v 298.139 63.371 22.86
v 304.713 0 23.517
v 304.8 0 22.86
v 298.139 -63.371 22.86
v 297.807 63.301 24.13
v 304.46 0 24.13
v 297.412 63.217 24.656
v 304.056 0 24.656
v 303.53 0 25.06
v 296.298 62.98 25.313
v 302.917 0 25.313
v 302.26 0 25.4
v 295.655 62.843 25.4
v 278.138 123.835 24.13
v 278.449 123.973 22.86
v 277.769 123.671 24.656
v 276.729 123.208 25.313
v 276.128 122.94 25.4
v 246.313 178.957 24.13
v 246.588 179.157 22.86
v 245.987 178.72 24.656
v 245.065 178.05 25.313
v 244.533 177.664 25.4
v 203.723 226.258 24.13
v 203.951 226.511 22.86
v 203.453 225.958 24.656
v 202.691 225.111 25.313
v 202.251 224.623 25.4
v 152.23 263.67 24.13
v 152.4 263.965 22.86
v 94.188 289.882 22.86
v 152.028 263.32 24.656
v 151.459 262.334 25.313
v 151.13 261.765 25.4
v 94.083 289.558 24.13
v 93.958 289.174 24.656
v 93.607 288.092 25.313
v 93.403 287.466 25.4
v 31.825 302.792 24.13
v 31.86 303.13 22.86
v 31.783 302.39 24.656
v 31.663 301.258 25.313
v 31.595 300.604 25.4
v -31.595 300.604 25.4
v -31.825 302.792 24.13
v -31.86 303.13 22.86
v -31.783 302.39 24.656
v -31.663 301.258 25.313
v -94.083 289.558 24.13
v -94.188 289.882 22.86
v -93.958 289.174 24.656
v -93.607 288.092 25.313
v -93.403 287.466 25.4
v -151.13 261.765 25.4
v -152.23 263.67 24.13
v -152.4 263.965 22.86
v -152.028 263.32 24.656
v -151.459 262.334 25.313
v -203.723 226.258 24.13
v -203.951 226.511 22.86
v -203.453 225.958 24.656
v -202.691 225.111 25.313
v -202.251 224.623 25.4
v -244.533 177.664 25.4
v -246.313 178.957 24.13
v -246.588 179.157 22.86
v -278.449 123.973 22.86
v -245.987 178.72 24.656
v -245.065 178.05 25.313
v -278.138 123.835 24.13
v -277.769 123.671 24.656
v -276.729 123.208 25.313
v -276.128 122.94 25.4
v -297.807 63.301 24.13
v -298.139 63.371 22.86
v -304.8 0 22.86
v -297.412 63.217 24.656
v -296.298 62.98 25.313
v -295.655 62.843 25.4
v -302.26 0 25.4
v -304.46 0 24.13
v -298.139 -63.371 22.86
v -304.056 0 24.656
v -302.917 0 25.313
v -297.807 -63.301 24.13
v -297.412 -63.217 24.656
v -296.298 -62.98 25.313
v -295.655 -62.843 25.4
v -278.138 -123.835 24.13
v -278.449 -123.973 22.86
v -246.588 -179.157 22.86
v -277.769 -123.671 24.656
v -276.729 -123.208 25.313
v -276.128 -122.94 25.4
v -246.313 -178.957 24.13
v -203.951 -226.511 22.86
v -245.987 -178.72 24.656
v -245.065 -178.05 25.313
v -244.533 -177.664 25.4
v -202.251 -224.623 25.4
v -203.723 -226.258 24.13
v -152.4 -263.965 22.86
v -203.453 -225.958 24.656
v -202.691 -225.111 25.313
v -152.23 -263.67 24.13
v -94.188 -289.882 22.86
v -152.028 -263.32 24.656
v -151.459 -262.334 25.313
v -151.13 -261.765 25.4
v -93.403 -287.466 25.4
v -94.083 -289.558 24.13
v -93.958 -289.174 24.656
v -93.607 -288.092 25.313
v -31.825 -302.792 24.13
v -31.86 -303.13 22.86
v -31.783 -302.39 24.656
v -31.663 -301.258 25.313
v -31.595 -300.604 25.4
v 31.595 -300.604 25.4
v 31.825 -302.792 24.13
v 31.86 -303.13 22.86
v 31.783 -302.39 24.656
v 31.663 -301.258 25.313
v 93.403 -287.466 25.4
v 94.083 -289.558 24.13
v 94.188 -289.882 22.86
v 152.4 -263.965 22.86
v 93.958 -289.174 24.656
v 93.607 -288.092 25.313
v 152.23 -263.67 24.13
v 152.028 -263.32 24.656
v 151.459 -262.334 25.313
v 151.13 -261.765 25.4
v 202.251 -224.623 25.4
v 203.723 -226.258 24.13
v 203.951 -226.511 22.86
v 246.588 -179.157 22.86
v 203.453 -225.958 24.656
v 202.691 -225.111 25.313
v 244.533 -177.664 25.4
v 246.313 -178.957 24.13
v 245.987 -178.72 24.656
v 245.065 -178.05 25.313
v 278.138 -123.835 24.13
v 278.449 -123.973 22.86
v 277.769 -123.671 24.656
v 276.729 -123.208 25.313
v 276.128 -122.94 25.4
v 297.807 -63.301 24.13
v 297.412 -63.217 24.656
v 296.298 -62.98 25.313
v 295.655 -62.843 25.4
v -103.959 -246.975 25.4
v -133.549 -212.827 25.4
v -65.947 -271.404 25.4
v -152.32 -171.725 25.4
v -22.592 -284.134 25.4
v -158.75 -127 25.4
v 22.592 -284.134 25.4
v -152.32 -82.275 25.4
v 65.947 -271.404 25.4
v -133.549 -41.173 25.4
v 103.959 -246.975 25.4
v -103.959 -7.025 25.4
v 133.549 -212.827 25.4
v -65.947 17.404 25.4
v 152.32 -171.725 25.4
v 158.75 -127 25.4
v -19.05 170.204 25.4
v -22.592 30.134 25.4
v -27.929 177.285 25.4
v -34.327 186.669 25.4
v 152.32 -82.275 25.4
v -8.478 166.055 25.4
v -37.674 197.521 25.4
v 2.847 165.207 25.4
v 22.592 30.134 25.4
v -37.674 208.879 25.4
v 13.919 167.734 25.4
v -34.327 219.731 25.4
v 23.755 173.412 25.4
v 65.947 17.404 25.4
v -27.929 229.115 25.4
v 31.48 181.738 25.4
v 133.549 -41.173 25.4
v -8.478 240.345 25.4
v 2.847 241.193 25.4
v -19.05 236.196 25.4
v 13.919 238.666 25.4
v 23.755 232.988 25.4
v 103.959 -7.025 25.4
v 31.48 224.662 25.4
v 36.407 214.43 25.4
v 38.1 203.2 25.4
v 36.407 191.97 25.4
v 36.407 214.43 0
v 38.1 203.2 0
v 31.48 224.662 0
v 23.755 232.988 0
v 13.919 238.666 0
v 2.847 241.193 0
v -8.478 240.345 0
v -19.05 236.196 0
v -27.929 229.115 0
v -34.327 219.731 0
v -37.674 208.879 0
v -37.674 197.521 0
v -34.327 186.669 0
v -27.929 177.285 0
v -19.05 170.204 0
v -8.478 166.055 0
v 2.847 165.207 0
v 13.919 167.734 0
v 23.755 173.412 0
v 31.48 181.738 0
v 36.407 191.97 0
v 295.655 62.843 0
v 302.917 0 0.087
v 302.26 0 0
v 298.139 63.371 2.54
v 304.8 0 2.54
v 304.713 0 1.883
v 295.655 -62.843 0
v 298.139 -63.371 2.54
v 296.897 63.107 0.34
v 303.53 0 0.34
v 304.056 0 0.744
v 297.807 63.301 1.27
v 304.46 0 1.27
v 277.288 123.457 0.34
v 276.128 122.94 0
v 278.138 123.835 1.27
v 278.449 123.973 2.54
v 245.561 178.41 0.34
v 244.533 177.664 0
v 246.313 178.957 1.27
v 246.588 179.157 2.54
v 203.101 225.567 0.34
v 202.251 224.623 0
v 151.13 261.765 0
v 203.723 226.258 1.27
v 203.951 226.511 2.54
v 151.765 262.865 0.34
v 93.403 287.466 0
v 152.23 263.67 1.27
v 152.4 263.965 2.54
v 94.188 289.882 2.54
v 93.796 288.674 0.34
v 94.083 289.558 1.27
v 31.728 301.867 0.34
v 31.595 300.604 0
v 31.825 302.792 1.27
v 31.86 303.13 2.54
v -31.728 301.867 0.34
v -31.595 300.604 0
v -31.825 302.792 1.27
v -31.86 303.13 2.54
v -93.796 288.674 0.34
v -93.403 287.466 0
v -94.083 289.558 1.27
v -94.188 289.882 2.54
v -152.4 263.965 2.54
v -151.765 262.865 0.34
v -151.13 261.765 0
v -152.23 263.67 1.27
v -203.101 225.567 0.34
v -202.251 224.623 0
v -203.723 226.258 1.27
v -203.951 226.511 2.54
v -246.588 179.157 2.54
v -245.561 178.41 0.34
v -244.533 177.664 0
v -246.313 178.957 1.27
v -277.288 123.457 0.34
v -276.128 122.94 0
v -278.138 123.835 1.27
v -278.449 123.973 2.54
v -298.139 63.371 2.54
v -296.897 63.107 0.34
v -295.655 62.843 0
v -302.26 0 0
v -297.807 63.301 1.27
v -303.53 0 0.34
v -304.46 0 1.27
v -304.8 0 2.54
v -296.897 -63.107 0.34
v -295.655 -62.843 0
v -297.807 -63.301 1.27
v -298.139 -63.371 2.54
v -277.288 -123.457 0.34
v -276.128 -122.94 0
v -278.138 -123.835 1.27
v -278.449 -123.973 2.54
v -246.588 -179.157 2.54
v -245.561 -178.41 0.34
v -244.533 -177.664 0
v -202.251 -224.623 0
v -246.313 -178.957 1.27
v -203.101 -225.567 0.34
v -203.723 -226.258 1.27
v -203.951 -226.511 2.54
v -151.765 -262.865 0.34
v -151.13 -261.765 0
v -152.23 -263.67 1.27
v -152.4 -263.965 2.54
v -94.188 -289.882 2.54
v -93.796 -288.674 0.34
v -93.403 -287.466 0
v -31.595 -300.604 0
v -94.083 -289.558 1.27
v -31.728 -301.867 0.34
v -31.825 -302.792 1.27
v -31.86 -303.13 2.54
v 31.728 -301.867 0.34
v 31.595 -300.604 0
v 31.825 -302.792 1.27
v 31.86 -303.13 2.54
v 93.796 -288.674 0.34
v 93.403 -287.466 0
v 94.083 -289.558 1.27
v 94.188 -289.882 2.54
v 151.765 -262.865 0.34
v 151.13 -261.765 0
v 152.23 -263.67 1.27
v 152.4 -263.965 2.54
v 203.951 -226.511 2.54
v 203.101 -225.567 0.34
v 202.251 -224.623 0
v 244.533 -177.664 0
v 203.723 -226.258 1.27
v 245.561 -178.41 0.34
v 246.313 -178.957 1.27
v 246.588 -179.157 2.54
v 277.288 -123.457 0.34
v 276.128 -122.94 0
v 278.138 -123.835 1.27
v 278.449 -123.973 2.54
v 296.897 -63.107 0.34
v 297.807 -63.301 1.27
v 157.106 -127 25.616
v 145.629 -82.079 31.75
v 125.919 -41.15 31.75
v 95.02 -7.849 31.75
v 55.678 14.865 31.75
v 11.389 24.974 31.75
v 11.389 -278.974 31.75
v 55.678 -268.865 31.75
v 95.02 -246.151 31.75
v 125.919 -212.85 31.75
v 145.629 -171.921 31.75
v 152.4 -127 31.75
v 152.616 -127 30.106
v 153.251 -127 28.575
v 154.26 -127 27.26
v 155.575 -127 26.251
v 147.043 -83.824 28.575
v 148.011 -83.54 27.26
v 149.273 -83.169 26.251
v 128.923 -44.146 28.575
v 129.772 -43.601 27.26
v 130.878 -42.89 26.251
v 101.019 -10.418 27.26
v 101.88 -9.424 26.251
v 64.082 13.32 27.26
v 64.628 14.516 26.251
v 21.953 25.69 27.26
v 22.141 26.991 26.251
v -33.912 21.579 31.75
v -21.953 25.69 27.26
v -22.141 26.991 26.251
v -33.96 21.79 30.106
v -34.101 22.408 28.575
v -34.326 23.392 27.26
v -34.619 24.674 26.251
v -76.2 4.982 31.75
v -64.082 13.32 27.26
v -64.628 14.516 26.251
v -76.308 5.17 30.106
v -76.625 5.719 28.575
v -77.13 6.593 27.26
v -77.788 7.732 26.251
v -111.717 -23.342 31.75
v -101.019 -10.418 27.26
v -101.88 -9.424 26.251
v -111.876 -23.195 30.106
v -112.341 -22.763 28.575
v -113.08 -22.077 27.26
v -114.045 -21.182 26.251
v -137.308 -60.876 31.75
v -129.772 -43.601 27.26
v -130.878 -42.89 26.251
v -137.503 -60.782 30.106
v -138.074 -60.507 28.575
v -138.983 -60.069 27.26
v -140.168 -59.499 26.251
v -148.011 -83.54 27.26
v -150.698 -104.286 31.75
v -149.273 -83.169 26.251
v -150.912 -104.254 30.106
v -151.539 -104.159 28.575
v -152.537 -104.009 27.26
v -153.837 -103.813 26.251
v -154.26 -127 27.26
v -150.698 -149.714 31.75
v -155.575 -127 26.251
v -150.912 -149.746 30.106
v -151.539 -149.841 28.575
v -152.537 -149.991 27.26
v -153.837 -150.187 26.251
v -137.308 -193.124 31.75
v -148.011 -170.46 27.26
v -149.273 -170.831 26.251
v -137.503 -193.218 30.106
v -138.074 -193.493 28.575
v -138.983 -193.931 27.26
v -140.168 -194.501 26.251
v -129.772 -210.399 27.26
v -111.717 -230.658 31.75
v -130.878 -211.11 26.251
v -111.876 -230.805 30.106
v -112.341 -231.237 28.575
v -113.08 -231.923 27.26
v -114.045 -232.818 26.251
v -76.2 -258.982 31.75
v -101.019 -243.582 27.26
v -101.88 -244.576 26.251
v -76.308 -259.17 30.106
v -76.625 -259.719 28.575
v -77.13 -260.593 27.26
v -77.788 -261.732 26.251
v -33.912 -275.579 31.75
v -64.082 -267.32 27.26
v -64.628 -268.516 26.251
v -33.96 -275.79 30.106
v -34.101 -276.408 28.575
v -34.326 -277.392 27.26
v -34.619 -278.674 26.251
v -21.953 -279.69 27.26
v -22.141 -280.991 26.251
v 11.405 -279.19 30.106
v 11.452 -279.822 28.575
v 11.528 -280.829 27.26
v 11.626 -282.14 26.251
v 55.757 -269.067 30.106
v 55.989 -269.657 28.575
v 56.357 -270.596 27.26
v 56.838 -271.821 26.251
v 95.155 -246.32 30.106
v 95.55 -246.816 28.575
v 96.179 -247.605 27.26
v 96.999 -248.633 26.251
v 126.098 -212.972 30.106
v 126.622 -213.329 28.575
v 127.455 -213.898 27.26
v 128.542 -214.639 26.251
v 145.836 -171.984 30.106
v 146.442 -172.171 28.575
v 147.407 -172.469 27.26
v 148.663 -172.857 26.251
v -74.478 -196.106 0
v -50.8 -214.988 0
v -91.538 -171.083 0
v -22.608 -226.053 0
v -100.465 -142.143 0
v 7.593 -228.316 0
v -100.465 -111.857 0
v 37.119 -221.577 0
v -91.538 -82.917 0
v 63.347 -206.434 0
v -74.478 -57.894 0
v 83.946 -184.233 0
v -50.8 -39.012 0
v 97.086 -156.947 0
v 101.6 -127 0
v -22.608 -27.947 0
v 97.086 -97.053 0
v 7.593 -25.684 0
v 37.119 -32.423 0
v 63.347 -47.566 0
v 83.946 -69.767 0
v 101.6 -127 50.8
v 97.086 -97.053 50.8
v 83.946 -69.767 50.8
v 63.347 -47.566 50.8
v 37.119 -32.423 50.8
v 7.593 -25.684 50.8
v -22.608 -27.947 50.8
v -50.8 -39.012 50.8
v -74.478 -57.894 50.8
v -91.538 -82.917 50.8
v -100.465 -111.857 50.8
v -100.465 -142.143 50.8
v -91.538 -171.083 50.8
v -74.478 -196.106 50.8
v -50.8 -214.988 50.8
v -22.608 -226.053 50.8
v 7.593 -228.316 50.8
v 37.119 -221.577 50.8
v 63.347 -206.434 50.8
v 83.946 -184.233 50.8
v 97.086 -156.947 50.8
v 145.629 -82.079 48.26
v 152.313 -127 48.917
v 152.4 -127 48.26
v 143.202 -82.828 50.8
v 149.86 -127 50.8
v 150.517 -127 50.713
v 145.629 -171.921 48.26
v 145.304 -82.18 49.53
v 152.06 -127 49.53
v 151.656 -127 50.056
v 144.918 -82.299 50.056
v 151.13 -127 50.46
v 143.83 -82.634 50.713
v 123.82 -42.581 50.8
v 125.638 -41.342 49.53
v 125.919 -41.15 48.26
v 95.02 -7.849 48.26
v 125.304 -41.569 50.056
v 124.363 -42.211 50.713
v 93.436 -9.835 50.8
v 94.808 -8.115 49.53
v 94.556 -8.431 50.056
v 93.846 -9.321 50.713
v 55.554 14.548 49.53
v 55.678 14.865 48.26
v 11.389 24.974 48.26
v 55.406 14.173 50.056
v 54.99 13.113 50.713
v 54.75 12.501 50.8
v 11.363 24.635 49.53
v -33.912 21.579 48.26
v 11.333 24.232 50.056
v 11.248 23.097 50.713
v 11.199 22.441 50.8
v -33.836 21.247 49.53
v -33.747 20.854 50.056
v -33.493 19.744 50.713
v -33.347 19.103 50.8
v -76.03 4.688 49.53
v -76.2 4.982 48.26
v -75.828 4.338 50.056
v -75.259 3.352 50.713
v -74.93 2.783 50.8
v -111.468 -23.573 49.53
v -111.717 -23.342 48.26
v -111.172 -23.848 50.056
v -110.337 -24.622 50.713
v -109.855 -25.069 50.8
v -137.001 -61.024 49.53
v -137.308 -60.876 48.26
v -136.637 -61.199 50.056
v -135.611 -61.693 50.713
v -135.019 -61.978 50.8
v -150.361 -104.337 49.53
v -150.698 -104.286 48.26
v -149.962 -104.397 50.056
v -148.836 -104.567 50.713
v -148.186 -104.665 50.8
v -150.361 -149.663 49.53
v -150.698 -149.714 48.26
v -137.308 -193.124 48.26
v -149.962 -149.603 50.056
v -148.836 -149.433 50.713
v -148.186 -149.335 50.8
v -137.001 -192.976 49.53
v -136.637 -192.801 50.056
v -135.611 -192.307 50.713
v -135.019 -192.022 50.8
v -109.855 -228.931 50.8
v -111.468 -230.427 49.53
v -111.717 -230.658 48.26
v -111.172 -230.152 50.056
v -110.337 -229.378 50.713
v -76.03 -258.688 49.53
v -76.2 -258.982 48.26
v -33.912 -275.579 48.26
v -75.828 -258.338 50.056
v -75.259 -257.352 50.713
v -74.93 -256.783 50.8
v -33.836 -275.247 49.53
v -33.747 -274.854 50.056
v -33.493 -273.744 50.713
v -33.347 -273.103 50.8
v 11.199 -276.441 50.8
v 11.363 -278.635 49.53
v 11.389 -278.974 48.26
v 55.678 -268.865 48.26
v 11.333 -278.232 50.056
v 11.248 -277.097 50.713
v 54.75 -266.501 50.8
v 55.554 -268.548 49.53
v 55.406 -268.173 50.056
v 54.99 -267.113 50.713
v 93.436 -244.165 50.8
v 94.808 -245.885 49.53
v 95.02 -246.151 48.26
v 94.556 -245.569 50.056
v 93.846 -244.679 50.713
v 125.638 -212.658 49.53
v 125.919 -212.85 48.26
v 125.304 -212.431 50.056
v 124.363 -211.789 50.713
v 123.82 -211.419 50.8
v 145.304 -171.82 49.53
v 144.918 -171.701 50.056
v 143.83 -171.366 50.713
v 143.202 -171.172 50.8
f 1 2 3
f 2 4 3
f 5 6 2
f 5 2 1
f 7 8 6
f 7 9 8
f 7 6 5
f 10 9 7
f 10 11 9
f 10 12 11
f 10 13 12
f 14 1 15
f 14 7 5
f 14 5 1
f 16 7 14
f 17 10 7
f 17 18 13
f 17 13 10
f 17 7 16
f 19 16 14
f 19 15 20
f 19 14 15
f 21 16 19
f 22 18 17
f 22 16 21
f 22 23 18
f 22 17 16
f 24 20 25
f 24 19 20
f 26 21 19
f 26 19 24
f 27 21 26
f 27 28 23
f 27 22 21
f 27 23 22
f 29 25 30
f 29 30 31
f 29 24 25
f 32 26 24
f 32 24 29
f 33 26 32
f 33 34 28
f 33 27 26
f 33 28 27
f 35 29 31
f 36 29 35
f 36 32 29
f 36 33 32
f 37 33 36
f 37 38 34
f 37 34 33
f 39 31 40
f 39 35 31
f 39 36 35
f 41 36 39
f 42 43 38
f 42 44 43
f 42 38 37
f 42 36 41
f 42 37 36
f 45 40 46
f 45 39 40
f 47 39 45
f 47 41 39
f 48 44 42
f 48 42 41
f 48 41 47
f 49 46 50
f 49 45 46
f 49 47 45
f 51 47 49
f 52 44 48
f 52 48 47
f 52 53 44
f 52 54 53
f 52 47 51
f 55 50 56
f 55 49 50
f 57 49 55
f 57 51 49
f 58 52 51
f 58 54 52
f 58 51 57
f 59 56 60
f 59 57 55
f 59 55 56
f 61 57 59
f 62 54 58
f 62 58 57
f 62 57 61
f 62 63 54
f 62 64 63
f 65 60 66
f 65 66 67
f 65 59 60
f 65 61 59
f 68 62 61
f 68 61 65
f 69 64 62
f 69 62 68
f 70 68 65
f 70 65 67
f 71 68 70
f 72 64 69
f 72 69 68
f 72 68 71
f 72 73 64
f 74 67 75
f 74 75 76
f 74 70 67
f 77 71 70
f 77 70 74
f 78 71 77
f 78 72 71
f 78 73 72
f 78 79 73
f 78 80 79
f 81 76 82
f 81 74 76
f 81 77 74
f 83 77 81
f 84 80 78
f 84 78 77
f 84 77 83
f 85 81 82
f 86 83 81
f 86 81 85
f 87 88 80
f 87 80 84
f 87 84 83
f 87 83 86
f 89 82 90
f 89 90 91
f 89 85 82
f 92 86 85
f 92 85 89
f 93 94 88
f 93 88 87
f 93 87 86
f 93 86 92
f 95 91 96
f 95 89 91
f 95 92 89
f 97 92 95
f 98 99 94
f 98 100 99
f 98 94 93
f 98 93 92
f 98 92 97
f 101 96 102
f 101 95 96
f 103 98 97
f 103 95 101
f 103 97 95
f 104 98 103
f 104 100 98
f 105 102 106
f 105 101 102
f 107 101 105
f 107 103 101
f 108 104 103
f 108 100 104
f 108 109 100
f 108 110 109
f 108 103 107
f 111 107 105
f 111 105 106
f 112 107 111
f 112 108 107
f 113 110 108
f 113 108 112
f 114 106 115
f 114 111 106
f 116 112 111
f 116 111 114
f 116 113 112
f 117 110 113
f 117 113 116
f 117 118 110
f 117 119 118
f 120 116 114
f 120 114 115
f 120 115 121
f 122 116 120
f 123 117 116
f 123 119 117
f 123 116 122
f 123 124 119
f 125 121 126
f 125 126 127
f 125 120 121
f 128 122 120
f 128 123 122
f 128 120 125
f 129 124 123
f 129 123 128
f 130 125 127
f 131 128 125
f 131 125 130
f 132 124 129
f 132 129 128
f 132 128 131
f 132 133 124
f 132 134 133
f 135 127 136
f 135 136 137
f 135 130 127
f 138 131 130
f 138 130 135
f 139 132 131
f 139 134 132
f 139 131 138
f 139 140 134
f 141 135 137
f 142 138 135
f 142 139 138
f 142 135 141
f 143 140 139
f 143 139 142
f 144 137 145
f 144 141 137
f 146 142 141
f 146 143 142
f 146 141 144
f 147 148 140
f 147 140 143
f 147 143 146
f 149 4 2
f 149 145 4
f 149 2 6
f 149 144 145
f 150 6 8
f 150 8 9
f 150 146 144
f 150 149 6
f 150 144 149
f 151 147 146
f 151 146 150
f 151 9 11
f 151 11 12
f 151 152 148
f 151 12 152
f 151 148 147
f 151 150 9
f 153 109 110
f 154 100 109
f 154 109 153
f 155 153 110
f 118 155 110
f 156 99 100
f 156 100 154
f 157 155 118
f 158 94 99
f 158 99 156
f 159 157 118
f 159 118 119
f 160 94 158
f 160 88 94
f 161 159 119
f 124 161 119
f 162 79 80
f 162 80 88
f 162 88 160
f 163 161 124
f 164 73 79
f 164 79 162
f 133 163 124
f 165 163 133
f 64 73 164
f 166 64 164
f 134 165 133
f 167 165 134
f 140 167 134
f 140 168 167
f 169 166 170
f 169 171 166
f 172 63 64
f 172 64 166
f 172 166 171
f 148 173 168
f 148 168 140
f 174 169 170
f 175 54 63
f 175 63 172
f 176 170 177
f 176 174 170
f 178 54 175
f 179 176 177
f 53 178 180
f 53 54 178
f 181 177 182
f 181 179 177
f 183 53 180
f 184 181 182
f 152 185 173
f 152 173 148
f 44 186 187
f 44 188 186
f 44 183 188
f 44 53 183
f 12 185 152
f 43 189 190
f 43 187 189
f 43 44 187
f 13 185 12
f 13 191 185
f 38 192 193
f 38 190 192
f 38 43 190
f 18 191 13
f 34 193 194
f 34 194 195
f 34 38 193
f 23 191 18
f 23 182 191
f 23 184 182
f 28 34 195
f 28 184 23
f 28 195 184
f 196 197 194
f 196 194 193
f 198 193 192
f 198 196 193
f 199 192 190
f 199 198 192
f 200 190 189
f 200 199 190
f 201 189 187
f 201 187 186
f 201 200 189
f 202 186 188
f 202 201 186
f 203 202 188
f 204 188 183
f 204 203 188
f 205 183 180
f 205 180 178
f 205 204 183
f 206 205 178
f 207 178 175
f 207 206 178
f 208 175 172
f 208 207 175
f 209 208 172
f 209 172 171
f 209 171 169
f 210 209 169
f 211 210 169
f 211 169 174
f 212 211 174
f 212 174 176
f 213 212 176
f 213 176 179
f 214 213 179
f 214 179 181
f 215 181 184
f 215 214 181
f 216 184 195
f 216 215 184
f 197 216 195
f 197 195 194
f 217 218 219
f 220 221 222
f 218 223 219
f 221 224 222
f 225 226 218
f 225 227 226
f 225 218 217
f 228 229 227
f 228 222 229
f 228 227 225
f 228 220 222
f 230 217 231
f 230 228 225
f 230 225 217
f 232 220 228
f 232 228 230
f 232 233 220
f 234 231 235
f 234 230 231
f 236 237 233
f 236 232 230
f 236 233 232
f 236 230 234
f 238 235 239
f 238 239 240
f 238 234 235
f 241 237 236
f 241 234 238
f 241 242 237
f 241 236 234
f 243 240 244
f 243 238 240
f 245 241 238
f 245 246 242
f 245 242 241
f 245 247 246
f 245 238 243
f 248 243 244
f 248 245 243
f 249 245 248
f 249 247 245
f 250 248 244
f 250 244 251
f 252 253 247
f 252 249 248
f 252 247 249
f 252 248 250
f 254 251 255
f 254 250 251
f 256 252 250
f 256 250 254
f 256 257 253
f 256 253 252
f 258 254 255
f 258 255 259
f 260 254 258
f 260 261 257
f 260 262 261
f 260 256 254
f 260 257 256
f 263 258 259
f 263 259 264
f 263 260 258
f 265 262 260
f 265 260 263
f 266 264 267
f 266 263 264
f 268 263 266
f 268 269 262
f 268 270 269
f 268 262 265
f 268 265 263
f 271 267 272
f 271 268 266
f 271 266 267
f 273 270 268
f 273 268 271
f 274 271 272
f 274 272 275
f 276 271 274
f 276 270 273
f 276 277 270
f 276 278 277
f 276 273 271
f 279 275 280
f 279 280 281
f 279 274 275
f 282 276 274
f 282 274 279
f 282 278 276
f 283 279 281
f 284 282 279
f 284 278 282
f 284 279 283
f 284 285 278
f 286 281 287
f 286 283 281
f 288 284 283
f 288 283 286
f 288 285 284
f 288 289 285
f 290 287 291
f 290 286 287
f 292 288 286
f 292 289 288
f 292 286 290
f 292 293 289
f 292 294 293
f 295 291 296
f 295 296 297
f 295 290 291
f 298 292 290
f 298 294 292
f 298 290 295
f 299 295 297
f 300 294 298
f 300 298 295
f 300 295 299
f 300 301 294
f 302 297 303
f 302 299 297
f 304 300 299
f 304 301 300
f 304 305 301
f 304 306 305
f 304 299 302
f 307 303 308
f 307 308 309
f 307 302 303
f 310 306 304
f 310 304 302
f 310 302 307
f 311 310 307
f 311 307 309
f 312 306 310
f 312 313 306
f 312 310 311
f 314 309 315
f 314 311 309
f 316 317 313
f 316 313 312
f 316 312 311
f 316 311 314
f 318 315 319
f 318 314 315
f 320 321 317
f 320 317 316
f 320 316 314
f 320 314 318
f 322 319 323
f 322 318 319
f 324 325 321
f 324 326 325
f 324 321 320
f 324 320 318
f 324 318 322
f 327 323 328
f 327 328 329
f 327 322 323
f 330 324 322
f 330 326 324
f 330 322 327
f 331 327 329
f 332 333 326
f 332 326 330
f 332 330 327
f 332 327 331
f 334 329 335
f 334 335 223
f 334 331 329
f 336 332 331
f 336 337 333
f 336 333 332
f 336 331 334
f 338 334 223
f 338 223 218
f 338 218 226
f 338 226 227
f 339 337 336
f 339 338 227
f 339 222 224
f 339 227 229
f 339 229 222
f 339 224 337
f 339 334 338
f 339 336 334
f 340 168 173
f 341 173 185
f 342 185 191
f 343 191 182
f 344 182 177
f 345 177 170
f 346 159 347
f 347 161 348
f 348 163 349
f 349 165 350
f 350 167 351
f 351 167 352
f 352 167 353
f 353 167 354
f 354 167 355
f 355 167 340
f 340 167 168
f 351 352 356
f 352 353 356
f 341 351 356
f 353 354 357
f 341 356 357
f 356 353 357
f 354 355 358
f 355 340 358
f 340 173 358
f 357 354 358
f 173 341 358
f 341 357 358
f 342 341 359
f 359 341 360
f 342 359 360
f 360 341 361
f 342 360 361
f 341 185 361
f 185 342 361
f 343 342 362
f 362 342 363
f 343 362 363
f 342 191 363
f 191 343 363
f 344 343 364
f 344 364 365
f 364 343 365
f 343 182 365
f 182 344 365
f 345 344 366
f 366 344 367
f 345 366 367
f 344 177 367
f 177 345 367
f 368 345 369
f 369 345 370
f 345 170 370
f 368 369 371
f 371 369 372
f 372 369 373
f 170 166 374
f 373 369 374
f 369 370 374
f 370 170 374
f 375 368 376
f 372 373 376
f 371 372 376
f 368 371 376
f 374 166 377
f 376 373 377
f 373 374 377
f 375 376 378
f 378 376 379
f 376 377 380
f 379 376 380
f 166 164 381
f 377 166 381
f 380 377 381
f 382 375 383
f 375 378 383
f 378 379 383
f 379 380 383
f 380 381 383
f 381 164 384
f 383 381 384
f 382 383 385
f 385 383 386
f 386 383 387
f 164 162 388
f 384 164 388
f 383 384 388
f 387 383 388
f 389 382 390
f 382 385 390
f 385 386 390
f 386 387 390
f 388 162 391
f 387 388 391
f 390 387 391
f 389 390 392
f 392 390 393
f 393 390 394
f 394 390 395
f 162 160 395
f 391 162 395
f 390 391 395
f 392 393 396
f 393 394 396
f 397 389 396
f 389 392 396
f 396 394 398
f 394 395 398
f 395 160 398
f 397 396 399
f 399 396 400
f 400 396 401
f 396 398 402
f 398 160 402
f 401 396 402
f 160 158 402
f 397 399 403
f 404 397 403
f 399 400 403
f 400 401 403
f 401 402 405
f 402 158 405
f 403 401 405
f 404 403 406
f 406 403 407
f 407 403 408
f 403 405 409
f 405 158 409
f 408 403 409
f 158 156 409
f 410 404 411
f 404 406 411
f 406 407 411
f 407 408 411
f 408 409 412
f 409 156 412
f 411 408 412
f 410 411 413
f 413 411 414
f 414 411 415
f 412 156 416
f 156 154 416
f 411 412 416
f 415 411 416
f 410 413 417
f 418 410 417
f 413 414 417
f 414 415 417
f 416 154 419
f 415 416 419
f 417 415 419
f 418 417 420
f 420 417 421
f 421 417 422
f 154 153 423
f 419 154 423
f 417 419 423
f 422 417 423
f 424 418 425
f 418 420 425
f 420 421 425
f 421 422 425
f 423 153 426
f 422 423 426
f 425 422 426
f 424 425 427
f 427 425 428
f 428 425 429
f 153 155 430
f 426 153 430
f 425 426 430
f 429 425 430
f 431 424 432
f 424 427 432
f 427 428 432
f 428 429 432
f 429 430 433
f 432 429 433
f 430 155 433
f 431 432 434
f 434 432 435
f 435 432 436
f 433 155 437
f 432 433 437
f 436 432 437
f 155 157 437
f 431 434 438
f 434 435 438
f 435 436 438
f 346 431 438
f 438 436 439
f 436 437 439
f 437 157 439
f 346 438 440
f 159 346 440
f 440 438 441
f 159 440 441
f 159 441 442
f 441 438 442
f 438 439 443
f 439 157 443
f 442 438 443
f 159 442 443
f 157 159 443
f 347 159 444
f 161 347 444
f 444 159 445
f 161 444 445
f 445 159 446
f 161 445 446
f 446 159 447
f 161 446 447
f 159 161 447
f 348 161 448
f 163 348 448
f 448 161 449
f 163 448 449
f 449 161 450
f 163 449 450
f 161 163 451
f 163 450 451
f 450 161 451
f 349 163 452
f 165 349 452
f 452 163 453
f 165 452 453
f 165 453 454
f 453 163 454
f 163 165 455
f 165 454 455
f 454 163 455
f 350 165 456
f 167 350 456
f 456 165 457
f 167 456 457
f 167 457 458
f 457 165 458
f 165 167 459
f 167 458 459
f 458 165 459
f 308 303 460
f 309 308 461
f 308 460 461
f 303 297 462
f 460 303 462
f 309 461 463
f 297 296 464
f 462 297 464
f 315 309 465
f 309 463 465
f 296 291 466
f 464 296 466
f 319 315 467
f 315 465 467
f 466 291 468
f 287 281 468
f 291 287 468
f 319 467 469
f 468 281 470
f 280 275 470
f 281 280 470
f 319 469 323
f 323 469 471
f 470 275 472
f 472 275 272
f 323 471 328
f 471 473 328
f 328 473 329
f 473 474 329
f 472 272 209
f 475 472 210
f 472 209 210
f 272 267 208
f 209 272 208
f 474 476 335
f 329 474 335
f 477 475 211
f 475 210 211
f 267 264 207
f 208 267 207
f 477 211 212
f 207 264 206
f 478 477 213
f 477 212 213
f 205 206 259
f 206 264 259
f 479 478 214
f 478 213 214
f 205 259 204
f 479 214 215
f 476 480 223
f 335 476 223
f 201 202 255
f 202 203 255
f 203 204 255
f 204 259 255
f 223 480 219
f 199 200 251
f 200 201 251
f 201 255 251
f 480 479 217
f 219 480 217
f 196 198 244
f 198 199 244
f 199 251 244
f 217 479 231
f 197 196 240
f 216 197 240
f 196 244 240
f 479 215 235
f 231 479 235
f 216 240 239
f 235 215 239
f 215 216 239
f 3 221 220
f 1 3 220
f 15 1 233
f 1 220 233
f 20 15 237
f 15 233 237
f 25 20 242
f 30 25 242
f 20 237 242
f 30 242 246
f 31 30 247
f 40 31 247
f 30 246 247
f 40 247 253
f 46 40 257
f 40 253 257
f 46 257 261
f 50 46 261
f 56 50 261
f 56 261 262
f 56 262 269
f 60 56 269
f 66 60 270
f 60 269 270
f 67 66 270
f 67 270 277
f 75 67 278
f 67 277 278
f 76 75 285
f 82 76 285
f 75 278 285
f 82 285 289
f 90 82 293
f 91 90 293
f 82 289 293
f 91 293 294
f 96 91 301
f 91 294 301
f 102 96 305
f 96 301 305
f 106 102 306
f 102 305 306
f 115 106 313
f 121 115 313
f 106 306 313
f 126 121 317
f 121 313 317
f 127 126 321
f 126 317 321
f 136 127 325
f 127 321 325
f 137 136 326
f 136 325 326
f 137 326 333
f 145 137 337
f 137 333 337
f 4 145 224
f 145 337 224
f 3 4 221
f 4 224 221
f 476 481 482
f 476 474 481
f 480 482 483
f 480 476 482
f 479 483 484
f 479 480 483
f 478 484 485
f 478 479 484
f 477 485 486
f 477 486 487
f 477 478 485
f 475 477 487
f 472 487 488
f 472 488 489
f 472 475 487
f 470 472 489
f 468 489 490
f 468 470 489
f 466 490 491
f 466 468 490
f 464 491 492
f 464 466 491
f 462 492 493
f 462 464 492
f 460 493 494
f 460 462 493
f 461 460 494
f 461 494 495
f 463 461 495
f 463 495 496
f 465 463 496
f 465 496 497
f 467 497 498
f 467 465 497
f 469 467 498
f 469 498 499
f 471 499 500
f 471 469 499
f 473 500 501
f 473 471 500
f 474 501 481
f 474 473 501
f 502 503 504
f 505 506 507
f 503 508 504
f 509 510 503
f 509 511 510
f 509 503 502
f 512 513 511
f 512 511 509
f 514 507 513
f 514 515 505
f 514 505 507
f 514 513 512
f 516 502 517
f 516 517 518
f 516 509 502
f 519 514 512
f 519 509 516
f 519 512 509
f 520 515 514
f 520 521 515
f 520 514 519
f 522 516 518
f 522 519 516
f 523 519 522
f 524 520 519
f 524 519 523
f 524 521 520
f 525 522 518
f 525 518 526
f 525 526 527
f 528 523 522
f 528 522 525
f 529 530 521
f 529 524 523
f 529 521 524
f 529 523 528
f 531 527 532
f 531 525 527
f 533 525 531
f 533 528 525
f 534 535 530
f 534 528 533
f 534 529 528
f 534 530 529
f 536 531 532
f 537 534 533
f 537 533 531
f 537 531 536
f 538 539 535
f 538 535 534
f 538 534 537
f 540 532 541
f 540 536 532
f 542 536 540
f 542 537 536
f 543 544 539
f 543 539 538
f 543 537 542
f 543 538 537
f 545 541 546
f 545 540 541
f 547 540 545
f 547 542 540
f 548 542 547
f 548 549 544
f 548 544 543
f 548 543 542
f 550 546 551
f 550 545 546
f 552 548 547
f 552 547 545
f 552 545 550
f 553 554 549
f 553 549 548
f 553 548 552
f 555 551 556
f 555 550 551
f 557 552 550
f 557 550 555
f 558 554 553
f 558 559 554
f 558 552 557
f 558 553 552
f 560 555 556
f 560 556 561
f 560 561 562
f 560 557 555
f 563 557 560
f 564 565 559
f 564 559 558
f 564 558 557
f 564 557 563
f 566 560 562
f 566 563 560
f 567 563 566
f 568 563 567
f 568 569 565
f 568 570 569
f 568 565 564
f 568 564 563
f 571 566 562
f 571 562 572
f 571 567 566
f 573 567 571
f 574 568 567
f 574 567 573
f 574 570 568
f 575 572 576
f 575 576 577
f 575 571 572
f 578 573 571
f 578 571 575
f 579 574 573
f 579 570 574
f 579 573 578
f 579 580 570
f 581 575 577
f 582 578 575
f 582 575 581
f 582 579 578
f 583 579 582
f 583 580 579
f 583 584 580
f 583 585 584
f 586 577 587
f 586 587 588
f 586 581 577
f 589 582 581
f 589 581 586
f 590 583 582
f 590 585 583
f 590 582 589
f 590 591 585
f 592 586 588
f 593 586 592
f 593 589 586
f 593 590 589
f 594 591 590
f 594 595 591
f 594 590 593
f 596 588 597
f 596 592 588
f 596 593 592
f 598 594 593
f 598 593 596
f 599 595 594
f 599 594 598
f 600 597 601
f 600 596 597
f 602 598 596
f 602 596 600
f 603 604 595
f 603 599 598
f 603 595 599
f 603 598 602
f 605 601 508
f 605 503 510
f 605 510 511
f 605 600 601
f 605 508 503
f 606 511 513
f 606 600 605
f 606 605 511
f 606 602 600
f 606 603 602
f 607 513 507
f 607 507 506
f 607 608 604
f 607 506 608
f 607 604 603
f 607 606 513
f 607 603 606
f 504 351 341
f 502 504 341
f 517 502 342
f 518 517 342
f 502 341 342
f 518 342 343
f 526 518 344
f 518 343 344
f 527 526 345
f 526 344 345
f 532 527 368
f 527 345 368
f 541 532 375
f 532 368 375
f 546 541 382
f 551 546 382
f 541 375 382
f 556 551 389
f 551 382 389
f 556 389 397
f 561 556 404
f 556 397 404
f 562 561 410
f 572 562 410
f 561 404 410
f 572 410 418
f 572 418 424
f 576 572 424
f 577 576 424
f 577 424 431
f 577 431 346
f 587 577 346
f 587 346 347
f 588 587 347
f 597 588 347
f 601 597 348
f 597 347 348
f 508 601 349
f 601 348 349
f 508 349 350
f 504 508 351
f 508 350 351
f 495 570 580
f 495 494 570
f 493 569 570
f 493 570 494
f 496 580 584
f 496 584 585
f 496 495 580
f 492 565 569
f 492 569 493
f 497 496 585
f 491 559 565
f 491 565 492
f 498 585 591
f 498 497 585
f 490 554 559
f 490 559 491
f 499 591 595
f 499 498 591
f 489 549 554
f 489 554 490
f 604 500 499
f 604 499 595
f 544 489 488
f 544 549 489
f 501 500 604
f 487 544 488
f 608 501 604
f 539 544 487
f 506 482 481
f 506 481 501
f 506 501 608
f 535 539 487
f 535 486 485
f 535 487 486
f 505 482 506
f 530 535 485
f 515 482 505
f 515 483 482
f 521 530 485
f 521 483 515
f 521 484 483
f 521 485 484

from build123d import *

# Parameters (mm, degrees)
SKETCH1_R           = 304.8
SKETCH1_R_2         = 101.6
SKETCH1_R_3         = 38.1
BOSS_EXTRUDE1_DEPTH = 25.4
SKETCH2_R           = 152.4
SKETCH2_R_2         = 101.6
BOSS_EXTRUDE2_DEPTH = 25.4
FILLET1_R           = 2.54
FILLET2_R           = 6.35


with BuildPart() as part:
    # Sketch1 → Boss-Extrude1 (new body)
    with BuildSketch(Plane.XY):
        Circle(SKETCH1_R)
        with Locations((0, -127)):
            Circle(SKETCH1_R_2, mode=Mode.SUBTRACT)
        with Locations((0, 203.2)):
            Circle(SKETCH1_R_3, mode=Mode.SUBTRACT)
    extrude(amount=BOSS_EXTRUDE1_DEPTH)

    # Sketch2 → Boss-Extrude2 (add)
    with BuildSketch(Plane.XY.offset(25.4)):
        with Locations((0, -127)):
            Circle(SKETCH2_R)
        with Locations((0, -127)):
            Circle(SKETCH2_R_2, mode=Mode.SUBTRACT)
    extrude(amount=BOSS_EXTRUDE2_DEPTH)

    # Fillet1
    fillet1_edges = [part.edges().sort_by_distance(p)[0] for p in [
        (-152.4, -127, 50.8),
        (-304.8, 0, 0),
        (-304.8, 0, 25.4),
    ]]
    fillet(fillet1_edges, radius=FILLET1_R)

    # Fillet2
    fillet2_edges = [part.edges().sort_by_distance(p)[0] for p in [
        (-152.4, -127, 25.4),
    ]]
    fillet(fillet2_edges, radius=FILLET2_R)


solid = part.part
